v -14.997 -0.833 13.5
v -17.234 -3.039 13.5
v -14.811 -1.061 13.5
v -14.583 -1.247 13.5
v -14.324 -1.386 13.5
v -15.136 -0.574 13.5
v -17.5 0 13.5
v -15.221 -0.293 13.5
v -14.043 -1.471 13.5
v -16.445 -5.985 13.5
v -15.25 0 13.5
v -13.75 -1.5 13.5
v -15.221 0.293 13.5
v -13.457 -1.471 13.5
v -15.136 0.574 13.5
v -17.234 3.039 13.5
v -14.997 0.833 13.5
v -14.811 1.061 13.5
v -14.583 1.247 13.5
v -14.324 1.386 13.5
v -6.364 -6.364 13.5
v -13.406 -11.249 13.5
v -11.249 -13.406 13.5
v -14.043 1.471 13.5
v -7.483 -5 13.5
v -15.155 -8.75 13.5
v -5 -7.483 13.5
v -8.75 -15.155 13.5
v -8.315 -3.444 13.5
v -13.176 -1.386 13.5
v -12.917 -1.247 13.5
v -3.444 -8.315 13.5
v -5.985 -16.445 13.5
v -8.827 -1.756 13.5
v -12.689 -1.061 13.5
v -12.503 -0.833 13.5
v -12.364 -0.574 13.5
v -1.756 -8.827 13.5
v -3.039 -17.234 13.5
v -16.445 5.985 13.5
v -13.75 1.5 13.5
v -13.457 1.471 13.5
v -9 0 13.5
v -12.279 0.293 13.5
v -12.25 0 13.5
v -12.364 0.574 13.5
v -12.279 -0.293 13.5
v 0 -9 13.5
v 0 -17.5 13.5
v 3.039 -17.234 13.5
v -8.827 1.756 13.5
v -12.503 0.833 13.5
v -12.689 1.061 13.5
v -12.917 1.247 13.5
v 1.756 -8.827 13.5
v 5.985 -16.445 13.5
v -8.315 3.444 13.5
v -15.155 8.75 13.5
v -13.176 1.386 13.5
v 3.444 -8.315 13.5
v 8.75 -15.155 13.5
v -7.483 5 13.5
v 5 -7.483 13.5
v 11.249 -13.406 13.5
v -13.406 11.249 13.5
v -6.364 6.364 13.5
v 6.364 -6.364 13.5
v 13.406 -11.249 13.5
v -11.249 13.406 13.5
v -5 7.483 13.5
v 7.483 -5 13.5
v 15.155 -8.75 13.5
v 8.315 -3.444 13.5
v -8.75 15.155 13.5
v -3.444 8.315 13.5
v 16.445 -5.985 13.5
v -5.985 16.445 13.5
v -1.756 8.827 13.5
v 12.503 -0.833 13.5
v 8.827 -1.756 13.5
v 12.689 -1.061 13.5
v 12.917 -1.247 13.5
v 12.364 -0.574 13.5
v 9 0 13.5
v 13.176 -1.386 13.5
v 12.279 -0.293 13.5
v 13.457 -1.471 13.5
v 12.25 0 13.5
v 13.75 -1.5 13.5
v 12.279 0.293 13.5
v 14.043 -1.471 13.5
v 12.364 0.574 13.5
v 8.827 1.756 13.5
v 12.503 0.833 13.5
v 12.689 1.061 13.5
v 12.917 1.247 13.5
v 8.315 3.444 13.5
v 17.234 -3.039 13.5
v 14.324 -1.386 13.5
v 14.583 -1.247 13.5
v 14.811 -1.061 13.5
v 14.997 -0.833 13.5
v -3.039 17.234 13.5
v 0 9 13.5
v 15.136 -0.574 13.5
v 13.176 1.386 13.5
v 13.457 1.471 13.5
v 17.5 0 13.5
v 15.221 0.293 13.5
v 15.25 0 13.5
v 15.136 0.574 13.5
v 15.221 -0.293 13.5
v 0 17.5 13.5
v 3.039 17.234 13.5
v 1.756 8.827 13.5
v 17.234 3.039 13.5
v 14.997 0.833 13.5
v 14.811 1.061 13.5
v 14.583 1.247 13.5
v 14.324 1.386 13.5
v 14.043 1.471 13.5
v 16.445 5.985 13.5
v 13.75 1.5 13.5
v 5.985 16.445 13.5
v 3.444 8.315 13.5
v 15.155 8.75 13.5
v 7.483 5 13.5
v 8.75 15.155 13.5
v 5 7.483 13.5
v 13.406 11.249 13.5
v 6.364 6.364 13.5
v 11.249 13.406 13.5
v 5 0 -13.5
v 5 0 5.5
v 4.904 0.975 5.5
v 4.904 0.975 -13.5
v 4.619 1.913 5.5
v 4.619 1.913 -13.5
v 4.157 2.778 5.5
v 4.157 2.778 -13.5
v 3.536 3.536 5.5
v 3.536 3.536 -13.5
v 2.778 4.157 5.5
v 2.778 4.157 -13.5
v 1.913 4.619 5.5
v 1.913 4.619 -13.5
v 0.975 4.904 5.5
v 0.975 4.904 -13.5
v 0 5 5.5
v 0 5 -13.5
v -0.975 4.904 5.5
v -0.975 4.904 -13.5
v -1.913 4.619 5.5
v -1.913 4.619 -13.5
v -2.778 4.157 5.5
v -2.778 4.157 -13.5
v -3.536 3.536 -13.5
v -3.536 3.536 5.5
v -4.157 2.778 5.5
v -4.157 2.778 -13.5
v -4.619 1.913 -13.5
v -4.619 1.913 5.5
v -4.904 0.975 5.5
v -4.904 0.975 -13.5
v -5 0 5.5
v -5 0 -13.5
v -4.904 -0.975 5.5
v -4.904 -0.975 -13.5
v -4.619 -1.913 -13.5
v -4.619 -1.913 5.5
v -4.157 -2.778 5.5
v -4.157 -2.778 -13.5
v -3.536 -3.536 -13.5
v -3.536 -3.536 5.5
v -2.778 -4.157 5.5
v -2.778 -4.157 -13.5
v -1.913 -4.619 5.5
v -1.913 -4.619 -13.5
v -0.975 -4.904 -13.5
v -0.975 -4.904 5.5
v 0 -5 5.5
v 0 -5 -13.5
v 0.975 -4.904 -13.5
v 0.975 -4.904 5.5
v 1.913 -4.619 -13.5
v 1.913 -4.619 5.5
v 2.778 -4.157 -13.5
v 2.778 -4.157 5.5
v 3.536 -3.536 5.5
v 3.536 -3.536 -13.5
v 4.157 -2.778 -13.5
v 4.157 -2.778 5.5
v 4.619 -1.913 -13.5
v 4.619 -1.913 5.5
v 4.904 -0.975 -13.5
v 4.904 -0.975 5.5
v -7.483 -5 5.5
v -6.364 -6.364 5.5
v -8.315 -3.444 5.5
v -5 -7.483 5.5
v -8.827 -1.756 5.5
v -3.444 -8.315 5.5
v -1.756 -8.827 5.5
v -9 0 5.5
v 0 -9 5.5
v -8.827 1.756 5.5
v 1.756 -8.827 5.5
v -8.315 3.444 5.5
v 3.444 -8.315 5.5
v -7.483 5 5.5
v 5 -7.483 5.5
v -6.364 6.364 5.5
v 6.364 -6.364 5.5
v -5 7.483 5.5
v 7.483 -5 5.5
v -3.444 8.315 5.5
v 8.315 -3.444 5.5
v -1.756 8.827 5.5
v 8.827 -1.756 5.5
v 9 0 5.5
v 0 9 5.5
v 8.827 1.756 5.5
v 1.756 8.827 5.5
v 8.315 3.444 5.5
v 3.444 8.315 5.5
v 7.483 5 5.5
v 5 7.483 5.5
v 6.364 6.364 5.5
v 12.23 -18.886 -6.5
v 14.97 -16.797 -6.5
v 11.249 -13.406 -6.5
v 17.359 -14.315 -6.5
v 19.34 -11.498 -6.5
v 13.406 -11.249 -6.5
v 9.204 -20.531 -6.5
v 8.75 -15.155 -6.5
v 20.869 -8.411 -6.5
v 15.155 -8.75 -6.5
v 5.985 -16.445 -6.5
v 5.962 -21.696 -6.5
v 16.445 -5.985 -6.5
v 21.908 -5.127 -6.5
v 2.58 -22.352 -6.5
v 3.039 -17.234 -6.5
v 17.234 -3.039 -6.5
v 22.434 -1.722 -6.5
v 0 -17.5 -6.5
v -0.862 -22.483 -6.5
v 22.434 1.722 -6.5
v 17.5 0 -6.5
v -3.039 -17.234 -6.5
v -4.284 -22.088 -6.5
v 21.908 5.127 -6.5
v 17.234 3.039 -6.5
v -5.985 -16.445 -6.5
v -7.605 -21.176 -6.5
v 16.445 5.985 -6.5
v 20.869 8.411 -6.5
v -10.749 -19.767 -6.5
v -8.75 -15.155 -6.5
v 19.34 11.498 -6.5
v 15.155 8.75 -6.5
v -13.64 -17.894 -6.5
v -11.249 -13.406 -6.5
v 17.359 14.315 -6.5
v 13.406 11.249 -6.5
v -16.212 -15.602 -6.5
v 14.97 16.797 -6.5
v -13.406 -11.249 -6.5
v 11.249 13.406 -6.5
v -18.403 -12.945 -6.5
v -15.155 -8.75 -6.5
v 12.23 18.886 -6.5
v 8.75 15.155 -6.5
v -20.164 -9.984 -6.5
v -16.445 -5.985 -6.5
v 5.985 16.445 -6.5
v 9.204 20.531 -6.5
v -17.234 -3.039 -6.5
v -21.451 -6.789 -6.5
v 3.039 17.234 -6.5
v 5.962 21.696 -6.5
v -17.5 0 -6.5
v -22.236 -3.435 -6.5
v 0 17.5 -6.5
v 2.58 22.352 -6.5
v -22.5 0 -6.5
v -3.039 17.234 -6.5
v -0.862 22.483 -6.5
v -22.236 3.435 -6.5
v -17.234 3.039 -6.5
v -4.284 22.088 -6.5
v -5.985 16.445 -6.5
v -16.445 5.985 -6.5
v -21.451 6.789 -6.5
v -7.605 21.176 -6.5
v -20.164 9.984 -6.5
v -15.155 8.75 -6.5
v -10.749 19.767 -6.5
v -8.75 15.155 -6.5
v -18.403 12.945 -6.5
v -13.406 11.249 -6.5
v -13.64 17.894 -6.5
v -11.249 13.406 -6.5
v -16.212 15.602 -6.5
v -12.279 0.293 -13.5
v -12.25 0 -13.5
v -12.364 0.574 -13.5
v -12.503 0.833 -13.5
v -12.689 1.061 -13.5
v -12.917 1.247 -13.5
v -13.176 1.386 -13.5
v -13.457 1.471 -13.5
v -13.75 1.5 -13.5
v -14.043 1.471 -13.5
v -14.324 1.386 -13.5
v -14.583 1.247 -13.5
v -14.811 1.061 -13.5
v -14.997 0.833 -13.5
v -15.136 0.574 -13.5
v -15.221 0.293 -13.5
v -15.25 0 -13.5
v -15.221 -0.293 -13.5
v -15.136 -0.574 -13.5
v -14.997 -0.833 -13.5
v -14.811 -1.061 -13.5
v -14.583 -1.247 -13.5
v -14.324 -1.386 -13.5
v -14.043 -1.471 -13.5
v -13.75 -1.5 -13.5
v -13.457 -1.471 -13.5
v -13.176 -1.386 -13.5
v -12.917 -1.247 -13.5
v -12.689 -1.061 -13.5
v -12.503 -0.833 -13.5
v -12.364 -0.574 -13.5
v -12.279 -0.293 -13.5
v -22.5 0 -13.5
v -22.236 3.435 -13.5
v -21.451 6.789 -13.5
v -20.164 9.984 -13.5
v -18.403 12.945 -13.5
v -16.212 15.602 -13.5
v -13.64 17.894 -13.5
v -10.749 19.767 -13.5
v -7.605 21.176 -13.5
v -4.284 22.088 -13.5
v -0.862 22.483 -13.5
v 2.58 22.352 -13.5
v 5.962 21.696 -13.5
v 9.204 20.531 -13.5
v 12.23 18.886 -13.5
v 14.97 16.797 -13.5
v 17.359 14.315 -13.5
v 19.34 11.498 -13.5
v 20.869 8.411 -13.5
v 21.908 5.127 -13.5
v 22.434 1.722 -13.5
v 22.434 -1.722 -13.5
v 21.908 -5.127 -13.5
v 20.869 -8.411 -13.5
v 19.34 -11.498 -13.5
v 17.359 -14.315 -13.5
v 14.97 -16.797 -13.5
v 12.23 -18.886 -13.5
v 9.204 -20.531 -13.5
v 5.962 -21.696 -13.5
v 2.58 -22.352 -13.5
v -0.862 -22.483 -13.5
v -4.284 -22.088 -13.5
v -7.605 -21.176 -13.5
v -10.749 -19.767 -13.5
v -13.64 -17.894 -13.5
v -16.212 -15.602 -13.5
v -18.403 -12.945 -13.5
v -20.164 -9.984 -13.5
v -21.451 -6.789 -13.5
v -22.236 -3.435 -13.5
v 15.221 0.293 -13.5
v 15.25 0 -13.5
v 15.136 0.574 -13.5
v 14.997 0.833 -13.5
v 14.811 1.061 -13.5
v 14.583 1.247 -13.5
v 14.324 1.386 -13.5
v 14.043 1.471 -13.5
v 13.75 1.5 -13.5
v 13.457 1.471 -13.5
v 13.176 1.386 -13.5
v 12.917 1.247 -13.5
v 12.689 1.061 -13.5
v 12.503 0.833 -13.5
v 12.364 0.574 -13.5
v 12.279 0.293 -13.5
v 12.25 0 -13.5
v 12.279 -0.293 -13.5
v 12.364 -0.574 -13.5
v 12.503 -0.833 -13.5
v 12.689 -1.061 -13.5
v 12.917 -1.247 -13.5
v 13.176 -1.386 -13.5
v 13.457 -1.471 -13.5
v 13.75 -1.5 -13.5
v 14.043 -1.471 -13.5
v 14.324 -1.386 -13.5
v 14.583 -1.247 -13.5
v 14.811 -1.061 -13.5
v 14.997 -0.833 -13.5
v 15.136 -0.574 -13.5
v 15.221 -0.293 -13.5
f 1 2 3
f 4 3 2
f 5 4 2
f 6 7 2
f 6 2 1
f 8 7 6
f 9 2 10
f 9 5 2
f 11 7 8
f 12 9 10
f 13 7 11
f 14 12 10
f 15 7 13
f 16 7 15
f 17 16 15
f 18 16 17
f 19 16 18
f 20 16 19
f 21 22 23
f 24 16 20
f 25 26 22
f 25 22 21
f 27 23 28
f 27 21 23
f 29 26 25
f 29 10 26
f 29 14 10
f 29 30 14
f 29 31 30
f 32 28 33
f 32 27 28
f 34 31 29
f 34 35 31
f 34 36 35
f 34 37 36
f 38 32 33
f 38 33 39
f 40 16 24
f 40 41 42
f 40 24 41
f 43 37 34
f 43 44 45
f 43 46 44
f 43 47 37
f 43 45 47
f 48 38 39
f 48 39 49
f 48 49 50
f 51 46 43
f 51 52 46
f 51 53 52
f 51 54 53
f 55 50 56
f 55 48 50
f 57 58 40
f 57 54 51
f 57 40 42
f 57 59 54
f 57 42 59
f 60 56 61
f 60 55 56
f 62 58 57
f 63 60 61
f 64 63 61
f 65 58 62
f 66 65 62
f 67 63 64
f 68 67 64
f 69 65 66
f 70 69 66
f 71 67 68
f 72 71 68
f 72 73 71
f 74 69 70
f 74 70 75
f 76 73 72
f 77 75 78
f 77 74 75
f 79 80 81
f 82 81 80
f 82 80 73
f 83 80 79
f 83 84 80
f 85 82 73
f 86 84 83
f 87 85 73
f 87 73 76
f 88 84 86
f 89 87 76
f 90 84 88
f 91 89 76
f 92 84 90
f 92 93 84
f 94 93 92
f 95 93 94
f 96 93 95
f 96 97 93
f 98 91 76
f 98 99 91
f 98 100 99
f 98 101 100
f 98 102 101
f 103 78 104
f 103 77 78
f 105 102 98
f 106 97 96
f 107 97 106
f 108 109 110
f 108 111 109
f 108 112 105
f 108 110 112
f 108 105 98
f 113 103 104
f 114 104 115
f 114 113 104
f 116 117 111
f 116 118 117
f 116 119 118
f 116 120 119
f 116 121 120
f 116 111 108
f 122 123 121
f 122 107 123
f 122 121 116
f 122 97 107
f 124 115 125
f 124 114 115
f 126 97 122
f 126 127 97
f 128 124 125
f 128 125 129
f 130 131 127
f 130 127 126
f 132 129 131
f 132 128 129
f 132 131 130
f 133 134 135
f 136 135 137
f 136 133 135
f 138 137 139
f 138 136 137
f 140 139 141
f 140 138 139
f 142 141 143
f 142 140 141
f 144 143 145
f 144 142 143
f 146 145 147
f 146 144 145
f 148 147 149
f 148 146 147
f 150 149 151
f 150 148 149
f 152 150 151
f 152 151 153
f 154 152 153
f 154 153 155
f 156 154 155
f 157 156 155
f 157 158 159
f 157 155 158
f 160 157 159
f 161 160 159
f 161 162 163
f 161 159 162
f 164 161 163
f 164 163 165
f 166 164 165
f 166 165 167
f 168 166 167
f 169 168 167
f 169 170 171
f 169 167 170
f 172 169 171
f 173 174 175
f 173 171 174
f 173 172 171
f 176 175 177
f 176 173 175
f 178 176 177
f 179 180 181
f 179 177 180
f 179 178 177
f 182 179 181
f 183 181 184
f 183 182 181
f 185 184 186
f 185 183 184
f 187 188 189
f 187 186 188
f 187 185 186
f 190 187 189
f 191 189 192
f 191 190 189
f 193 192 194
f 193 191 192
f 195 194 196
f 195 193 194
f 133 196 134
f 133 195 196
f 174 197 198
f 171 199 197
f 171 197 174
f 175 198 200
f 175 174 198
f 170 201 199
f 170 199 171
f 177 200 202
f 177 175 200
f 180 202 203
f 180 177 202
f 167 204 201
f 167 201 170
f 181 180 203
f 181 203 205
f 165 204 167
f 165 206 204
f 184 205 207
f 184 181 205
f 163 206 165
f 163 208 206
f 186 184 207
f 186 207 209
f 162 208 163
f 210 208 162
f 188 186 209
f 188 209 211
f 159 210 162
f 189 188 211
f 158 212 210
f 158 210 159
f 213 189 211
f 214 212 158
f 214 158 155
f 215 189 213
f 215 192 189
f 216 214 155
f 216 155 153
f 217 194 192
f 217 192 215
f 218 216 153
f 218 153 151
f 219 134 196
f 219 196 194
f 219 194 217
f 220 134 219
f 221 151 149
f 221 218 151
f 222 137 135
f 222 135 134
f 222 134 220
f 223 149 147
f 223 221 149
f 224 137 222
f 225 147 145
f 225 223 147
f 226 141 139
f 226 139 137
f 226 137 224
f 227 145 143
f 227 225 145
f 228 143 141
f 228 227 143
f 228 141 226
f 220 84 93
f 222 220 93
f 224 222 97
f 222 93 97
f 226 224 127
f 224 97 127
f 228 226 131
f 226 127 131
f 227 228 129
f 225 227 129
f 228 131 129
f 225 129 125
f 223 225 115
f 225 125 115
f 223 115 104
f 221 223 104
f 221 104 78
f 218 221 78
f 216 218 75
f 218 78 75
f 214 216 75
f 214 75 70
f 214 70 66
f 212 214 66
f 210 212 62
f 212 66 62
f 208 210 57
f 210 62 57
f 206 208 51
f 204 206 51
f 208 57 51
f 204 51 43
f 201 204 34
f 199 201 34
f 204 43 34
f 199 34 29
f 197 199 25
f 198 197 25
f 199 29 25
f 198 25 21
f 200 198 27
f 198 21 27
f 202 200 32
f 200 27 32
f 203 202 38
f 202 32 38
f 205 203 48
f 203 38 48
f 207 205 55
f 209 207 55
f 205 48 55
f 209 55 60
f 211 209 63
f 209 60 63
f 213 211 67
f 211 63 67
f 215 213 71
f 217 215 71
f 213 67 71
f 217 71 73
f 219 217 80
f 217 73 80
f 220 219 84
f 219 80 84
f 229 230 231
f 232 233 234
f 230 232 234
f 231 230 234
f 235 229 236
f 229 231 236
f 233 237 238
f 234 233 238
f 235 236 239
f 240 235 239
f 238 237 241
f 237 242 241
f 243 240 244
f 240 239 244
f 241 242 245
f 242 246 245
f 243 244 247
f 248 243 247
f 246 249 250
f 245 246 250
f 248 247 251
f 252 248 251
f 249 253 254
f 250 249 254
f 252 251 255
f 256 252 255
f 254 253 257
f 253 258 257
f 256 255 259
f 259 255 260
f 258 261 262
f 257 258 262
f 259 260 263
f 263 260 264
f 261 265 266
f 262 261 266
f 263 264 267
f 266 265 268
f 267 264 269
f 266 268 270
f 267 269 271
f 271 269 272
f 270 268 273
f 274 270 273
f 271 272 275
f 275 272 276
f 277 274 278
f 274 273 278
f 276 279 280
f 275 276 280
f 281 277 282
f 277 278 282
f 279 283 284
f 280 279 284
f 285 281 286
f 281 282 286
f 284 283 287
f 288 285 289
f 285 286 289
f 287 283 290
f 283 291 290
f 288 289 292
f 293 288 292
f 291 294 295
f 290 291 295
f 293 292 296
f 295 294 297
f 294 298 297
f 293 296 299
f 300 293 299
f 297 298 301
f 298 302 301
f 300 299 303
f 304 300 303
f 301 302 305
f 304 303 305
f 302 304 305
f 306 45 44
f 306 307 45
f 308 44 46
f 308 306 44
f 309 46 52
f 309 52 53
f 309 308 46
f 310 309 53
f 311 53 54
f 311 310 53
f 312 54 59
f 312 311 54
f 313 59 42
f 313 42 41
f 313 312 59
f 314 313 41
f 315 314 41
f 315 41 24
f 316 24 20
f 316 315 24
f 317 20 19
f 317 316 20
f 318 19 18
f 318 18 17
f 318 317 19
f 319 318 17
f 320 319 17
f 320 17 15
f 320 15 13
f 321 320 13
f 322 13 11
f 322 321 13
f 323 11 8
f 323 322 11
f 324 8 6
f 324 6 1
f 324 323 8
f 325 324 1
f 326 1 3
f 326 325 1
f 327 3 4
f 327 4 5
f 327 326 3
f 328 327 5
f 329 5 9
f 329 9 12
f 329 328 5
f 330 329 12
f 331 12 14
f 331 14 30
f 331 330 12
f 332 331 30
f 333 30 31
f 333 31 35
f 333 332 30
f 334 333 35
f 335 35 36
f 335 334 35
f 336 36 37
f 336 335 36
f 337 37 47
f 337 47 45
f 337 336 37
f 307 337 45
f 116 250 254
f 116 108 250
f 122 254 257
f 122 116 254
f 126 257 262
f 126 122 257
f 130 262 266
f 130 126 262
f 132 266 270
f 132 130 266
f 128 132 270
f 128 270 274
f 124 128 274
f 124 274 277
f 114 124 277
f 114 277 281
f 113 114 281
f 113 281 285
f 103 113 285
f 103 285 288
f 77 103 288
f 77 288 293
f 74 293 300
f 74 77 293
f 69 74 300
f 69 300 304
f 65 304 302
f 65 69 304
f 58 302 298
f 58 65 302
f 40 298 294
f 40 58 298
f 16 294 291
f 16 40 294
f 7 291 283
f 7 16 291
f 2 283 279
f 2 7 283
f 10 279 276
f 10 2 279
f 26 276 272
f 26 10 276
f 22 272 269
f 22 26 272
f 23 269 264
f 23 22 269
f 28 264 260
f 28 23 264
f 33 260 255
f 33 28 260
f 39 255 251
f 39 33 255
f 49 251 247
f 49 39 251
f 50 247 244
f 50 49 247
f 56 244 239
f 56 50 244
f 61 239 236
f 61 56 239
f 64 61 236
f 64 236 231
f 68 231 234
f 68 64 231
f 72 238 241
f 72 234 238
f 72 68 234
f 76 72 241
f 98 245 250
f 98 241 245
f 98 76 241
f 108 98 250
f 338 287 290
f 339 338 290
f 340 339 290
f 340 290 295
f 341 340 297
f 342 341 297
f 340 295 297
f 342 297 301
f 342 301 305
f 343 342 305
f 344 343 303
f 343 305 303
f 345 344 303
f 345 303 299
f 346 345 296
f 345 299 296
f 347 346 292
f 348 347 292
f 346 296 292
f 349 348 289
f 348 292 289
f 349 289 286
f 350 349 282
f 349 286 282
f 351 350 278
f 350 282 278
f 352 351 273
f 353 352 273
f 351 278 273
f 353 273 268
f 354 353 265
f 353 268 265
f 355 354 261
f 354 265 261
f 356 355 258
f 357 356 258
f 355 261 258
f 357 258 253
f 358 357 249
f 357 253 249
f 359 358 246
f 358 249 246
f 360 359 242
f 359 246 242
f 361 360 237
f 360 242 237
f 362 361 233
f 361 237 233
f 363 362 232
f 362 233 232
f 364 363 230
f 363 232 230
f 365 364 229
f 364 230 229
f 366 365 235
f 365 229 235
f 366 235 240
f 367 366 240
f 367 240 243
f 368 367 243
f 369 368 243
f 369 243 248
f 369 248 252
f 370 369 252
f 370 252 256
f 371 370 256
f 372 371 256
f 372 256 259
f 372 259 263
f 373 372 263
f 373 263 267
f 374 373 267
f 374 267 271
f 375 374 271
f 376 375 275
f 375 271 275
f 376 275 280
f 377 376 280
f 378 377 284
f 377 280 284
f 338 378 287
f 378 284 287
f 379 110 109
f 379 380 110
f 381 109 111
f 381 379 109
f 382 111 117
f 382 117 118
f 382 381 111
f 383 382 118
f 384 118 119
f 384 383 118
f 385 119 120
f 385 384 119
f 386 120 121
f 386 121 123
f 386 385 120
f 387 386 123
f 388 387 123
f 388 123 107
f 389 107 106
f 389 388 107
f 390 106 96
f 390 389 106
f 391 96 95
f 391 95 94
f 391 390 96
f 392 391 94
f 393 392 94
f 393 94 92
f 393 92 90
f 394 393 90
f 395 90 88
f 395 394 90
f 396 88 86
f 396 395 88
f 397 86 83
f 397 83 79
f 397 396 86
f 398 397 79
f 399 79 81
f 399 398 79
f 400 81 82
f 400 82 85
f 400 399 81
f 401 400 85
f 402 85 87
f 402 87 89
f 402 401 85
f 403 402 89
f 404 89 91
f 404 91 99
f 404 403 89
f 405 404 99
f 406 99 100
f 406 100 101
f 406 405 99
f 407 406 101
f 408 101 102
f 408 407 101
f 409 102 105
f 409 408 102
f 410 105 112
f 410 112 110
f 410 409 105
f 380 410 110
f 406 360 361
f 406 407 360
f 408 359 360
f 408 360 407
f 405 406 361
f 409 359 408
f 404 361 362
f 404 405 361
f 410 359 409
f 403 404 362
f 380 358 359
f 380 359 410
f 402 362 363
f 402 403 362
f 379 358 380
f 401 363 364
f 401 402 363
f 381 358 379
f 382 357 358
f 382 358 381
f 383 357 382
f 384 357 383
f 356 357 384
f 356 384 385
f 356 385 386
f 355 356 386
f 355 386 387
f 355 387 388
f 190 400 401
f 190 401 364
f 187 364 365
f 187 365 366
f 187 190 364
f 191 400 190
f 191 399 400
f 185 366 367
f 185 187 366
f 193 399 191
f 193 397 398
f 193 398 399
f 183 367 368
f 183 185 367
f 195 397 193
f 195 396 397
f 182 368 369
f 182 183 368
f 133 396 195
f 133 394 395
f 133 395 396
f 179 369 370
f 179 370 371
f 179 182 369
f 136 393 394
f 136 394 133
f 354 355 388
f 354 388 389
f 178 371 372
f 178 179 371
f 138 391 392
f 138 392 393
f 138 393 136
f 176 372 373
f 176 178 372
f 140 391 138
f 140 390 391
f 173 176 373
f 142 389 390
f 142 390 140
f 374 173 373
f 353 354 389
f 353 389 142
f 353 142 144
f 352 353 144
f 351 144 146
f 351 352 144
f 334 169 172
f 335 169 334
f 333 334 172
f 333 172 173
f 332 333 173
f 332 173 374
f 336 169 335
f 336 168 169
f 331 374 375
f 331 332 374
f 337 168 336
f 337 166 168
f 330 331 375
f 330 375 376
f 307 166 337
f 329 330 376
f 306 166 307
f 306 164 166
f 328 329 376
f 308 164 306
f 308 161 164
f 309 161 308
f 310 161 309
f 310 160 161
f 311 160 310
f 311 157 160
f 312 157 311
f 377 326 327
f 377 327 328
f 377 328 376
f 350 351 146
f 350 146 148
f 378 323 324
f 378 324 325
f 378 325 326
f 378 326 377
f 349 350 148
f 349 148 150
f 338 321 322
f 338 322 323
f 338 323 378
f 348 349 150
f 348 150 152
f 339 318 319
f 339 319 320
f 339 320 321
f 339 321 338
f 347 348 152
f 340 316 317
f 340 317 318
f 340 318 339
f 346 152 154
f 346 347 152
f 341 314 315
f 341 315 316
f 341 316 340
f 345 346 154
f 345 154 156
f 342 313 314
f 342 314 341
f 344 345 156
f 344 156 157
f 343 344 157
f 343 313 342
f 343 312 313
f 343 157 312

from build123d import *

# Parameters (mm, degrees)
SKETCH1_R           = 17.5
SKETCH1_R_2         = 5
SKETCH1_R_3         = 1.5
BOSS_EXTRUDE1_DEPTH = 13.5
BOSS_EXTRUDE2_START = -7
SKETCH2_R           = 22.5
SKETCH2_R_2         = 17.5
BOSS_EXTRUDE2_DEPTH = 7
SKETCH3_R           = 7.5
SKETCH3_R_2         = 5
BOSS_EXTRUDE3_DEPTH = 8.5
SKETCH4_R           = 9
CUT_EXTRUDE1_DEPTH  = 8


with BuildPart() as part:
    # Sketch1 → Boss-Extrude1 (new, symmetric)
    with BuildSketch(Plane.XY):
        Circle(SKETCH1_R)
        Circle(SKETCH1_R_2, mode=Mode.SUBTRACT)
        with Locations((-13.75, 0)):
            Circle(SKETCH1_R_3, mode=Mode.SUBTRACT)
        with Locations((13.75, 0)):
            Circle(SKETCH1_R_3, mode=Mode.SUBTRACT)
    extrude(amount=BOSS_EXTRUDE1_DEPTH, both=True)

    # Sketch2 → Boss-Extrude2 (add)
    with BuildSketch(Plane(origin=(0, 0, -13.5), x_dir=(-1, 0, 0), z_dir=(0, 0, -1)).offset(BOSS_EXTRUDE2_START)):
        Circle(SKETCH2_R)
        Circle(SKETCH2_R_2, mode=Mode.SUBTRACT)
    extrude(amount=BOSS_EXTRUDE2_DEPTH)

    # Sketch3 → Boss-Extrude3 (add, symmetric)
    with BuildSketch(Plane.XY):
        Circle(SKETCH3_R)
        Circle(SKETCH3_R_2, mode=Mode.SUBTRACT)
    extrude(amount=BOSS_EXTRUDE3_DEPTH, both=True)

    # Sketch4 → Cut-Extrude1 (cut)
    with BuildSketch(Plane.XY.offset(13.5)):
        Circle(SKETCH4_R)
    extrude(amount=-CUT_EXTRUDE1_DEPTH, mode=Mode.SUBTRACT)


solid = part.part
